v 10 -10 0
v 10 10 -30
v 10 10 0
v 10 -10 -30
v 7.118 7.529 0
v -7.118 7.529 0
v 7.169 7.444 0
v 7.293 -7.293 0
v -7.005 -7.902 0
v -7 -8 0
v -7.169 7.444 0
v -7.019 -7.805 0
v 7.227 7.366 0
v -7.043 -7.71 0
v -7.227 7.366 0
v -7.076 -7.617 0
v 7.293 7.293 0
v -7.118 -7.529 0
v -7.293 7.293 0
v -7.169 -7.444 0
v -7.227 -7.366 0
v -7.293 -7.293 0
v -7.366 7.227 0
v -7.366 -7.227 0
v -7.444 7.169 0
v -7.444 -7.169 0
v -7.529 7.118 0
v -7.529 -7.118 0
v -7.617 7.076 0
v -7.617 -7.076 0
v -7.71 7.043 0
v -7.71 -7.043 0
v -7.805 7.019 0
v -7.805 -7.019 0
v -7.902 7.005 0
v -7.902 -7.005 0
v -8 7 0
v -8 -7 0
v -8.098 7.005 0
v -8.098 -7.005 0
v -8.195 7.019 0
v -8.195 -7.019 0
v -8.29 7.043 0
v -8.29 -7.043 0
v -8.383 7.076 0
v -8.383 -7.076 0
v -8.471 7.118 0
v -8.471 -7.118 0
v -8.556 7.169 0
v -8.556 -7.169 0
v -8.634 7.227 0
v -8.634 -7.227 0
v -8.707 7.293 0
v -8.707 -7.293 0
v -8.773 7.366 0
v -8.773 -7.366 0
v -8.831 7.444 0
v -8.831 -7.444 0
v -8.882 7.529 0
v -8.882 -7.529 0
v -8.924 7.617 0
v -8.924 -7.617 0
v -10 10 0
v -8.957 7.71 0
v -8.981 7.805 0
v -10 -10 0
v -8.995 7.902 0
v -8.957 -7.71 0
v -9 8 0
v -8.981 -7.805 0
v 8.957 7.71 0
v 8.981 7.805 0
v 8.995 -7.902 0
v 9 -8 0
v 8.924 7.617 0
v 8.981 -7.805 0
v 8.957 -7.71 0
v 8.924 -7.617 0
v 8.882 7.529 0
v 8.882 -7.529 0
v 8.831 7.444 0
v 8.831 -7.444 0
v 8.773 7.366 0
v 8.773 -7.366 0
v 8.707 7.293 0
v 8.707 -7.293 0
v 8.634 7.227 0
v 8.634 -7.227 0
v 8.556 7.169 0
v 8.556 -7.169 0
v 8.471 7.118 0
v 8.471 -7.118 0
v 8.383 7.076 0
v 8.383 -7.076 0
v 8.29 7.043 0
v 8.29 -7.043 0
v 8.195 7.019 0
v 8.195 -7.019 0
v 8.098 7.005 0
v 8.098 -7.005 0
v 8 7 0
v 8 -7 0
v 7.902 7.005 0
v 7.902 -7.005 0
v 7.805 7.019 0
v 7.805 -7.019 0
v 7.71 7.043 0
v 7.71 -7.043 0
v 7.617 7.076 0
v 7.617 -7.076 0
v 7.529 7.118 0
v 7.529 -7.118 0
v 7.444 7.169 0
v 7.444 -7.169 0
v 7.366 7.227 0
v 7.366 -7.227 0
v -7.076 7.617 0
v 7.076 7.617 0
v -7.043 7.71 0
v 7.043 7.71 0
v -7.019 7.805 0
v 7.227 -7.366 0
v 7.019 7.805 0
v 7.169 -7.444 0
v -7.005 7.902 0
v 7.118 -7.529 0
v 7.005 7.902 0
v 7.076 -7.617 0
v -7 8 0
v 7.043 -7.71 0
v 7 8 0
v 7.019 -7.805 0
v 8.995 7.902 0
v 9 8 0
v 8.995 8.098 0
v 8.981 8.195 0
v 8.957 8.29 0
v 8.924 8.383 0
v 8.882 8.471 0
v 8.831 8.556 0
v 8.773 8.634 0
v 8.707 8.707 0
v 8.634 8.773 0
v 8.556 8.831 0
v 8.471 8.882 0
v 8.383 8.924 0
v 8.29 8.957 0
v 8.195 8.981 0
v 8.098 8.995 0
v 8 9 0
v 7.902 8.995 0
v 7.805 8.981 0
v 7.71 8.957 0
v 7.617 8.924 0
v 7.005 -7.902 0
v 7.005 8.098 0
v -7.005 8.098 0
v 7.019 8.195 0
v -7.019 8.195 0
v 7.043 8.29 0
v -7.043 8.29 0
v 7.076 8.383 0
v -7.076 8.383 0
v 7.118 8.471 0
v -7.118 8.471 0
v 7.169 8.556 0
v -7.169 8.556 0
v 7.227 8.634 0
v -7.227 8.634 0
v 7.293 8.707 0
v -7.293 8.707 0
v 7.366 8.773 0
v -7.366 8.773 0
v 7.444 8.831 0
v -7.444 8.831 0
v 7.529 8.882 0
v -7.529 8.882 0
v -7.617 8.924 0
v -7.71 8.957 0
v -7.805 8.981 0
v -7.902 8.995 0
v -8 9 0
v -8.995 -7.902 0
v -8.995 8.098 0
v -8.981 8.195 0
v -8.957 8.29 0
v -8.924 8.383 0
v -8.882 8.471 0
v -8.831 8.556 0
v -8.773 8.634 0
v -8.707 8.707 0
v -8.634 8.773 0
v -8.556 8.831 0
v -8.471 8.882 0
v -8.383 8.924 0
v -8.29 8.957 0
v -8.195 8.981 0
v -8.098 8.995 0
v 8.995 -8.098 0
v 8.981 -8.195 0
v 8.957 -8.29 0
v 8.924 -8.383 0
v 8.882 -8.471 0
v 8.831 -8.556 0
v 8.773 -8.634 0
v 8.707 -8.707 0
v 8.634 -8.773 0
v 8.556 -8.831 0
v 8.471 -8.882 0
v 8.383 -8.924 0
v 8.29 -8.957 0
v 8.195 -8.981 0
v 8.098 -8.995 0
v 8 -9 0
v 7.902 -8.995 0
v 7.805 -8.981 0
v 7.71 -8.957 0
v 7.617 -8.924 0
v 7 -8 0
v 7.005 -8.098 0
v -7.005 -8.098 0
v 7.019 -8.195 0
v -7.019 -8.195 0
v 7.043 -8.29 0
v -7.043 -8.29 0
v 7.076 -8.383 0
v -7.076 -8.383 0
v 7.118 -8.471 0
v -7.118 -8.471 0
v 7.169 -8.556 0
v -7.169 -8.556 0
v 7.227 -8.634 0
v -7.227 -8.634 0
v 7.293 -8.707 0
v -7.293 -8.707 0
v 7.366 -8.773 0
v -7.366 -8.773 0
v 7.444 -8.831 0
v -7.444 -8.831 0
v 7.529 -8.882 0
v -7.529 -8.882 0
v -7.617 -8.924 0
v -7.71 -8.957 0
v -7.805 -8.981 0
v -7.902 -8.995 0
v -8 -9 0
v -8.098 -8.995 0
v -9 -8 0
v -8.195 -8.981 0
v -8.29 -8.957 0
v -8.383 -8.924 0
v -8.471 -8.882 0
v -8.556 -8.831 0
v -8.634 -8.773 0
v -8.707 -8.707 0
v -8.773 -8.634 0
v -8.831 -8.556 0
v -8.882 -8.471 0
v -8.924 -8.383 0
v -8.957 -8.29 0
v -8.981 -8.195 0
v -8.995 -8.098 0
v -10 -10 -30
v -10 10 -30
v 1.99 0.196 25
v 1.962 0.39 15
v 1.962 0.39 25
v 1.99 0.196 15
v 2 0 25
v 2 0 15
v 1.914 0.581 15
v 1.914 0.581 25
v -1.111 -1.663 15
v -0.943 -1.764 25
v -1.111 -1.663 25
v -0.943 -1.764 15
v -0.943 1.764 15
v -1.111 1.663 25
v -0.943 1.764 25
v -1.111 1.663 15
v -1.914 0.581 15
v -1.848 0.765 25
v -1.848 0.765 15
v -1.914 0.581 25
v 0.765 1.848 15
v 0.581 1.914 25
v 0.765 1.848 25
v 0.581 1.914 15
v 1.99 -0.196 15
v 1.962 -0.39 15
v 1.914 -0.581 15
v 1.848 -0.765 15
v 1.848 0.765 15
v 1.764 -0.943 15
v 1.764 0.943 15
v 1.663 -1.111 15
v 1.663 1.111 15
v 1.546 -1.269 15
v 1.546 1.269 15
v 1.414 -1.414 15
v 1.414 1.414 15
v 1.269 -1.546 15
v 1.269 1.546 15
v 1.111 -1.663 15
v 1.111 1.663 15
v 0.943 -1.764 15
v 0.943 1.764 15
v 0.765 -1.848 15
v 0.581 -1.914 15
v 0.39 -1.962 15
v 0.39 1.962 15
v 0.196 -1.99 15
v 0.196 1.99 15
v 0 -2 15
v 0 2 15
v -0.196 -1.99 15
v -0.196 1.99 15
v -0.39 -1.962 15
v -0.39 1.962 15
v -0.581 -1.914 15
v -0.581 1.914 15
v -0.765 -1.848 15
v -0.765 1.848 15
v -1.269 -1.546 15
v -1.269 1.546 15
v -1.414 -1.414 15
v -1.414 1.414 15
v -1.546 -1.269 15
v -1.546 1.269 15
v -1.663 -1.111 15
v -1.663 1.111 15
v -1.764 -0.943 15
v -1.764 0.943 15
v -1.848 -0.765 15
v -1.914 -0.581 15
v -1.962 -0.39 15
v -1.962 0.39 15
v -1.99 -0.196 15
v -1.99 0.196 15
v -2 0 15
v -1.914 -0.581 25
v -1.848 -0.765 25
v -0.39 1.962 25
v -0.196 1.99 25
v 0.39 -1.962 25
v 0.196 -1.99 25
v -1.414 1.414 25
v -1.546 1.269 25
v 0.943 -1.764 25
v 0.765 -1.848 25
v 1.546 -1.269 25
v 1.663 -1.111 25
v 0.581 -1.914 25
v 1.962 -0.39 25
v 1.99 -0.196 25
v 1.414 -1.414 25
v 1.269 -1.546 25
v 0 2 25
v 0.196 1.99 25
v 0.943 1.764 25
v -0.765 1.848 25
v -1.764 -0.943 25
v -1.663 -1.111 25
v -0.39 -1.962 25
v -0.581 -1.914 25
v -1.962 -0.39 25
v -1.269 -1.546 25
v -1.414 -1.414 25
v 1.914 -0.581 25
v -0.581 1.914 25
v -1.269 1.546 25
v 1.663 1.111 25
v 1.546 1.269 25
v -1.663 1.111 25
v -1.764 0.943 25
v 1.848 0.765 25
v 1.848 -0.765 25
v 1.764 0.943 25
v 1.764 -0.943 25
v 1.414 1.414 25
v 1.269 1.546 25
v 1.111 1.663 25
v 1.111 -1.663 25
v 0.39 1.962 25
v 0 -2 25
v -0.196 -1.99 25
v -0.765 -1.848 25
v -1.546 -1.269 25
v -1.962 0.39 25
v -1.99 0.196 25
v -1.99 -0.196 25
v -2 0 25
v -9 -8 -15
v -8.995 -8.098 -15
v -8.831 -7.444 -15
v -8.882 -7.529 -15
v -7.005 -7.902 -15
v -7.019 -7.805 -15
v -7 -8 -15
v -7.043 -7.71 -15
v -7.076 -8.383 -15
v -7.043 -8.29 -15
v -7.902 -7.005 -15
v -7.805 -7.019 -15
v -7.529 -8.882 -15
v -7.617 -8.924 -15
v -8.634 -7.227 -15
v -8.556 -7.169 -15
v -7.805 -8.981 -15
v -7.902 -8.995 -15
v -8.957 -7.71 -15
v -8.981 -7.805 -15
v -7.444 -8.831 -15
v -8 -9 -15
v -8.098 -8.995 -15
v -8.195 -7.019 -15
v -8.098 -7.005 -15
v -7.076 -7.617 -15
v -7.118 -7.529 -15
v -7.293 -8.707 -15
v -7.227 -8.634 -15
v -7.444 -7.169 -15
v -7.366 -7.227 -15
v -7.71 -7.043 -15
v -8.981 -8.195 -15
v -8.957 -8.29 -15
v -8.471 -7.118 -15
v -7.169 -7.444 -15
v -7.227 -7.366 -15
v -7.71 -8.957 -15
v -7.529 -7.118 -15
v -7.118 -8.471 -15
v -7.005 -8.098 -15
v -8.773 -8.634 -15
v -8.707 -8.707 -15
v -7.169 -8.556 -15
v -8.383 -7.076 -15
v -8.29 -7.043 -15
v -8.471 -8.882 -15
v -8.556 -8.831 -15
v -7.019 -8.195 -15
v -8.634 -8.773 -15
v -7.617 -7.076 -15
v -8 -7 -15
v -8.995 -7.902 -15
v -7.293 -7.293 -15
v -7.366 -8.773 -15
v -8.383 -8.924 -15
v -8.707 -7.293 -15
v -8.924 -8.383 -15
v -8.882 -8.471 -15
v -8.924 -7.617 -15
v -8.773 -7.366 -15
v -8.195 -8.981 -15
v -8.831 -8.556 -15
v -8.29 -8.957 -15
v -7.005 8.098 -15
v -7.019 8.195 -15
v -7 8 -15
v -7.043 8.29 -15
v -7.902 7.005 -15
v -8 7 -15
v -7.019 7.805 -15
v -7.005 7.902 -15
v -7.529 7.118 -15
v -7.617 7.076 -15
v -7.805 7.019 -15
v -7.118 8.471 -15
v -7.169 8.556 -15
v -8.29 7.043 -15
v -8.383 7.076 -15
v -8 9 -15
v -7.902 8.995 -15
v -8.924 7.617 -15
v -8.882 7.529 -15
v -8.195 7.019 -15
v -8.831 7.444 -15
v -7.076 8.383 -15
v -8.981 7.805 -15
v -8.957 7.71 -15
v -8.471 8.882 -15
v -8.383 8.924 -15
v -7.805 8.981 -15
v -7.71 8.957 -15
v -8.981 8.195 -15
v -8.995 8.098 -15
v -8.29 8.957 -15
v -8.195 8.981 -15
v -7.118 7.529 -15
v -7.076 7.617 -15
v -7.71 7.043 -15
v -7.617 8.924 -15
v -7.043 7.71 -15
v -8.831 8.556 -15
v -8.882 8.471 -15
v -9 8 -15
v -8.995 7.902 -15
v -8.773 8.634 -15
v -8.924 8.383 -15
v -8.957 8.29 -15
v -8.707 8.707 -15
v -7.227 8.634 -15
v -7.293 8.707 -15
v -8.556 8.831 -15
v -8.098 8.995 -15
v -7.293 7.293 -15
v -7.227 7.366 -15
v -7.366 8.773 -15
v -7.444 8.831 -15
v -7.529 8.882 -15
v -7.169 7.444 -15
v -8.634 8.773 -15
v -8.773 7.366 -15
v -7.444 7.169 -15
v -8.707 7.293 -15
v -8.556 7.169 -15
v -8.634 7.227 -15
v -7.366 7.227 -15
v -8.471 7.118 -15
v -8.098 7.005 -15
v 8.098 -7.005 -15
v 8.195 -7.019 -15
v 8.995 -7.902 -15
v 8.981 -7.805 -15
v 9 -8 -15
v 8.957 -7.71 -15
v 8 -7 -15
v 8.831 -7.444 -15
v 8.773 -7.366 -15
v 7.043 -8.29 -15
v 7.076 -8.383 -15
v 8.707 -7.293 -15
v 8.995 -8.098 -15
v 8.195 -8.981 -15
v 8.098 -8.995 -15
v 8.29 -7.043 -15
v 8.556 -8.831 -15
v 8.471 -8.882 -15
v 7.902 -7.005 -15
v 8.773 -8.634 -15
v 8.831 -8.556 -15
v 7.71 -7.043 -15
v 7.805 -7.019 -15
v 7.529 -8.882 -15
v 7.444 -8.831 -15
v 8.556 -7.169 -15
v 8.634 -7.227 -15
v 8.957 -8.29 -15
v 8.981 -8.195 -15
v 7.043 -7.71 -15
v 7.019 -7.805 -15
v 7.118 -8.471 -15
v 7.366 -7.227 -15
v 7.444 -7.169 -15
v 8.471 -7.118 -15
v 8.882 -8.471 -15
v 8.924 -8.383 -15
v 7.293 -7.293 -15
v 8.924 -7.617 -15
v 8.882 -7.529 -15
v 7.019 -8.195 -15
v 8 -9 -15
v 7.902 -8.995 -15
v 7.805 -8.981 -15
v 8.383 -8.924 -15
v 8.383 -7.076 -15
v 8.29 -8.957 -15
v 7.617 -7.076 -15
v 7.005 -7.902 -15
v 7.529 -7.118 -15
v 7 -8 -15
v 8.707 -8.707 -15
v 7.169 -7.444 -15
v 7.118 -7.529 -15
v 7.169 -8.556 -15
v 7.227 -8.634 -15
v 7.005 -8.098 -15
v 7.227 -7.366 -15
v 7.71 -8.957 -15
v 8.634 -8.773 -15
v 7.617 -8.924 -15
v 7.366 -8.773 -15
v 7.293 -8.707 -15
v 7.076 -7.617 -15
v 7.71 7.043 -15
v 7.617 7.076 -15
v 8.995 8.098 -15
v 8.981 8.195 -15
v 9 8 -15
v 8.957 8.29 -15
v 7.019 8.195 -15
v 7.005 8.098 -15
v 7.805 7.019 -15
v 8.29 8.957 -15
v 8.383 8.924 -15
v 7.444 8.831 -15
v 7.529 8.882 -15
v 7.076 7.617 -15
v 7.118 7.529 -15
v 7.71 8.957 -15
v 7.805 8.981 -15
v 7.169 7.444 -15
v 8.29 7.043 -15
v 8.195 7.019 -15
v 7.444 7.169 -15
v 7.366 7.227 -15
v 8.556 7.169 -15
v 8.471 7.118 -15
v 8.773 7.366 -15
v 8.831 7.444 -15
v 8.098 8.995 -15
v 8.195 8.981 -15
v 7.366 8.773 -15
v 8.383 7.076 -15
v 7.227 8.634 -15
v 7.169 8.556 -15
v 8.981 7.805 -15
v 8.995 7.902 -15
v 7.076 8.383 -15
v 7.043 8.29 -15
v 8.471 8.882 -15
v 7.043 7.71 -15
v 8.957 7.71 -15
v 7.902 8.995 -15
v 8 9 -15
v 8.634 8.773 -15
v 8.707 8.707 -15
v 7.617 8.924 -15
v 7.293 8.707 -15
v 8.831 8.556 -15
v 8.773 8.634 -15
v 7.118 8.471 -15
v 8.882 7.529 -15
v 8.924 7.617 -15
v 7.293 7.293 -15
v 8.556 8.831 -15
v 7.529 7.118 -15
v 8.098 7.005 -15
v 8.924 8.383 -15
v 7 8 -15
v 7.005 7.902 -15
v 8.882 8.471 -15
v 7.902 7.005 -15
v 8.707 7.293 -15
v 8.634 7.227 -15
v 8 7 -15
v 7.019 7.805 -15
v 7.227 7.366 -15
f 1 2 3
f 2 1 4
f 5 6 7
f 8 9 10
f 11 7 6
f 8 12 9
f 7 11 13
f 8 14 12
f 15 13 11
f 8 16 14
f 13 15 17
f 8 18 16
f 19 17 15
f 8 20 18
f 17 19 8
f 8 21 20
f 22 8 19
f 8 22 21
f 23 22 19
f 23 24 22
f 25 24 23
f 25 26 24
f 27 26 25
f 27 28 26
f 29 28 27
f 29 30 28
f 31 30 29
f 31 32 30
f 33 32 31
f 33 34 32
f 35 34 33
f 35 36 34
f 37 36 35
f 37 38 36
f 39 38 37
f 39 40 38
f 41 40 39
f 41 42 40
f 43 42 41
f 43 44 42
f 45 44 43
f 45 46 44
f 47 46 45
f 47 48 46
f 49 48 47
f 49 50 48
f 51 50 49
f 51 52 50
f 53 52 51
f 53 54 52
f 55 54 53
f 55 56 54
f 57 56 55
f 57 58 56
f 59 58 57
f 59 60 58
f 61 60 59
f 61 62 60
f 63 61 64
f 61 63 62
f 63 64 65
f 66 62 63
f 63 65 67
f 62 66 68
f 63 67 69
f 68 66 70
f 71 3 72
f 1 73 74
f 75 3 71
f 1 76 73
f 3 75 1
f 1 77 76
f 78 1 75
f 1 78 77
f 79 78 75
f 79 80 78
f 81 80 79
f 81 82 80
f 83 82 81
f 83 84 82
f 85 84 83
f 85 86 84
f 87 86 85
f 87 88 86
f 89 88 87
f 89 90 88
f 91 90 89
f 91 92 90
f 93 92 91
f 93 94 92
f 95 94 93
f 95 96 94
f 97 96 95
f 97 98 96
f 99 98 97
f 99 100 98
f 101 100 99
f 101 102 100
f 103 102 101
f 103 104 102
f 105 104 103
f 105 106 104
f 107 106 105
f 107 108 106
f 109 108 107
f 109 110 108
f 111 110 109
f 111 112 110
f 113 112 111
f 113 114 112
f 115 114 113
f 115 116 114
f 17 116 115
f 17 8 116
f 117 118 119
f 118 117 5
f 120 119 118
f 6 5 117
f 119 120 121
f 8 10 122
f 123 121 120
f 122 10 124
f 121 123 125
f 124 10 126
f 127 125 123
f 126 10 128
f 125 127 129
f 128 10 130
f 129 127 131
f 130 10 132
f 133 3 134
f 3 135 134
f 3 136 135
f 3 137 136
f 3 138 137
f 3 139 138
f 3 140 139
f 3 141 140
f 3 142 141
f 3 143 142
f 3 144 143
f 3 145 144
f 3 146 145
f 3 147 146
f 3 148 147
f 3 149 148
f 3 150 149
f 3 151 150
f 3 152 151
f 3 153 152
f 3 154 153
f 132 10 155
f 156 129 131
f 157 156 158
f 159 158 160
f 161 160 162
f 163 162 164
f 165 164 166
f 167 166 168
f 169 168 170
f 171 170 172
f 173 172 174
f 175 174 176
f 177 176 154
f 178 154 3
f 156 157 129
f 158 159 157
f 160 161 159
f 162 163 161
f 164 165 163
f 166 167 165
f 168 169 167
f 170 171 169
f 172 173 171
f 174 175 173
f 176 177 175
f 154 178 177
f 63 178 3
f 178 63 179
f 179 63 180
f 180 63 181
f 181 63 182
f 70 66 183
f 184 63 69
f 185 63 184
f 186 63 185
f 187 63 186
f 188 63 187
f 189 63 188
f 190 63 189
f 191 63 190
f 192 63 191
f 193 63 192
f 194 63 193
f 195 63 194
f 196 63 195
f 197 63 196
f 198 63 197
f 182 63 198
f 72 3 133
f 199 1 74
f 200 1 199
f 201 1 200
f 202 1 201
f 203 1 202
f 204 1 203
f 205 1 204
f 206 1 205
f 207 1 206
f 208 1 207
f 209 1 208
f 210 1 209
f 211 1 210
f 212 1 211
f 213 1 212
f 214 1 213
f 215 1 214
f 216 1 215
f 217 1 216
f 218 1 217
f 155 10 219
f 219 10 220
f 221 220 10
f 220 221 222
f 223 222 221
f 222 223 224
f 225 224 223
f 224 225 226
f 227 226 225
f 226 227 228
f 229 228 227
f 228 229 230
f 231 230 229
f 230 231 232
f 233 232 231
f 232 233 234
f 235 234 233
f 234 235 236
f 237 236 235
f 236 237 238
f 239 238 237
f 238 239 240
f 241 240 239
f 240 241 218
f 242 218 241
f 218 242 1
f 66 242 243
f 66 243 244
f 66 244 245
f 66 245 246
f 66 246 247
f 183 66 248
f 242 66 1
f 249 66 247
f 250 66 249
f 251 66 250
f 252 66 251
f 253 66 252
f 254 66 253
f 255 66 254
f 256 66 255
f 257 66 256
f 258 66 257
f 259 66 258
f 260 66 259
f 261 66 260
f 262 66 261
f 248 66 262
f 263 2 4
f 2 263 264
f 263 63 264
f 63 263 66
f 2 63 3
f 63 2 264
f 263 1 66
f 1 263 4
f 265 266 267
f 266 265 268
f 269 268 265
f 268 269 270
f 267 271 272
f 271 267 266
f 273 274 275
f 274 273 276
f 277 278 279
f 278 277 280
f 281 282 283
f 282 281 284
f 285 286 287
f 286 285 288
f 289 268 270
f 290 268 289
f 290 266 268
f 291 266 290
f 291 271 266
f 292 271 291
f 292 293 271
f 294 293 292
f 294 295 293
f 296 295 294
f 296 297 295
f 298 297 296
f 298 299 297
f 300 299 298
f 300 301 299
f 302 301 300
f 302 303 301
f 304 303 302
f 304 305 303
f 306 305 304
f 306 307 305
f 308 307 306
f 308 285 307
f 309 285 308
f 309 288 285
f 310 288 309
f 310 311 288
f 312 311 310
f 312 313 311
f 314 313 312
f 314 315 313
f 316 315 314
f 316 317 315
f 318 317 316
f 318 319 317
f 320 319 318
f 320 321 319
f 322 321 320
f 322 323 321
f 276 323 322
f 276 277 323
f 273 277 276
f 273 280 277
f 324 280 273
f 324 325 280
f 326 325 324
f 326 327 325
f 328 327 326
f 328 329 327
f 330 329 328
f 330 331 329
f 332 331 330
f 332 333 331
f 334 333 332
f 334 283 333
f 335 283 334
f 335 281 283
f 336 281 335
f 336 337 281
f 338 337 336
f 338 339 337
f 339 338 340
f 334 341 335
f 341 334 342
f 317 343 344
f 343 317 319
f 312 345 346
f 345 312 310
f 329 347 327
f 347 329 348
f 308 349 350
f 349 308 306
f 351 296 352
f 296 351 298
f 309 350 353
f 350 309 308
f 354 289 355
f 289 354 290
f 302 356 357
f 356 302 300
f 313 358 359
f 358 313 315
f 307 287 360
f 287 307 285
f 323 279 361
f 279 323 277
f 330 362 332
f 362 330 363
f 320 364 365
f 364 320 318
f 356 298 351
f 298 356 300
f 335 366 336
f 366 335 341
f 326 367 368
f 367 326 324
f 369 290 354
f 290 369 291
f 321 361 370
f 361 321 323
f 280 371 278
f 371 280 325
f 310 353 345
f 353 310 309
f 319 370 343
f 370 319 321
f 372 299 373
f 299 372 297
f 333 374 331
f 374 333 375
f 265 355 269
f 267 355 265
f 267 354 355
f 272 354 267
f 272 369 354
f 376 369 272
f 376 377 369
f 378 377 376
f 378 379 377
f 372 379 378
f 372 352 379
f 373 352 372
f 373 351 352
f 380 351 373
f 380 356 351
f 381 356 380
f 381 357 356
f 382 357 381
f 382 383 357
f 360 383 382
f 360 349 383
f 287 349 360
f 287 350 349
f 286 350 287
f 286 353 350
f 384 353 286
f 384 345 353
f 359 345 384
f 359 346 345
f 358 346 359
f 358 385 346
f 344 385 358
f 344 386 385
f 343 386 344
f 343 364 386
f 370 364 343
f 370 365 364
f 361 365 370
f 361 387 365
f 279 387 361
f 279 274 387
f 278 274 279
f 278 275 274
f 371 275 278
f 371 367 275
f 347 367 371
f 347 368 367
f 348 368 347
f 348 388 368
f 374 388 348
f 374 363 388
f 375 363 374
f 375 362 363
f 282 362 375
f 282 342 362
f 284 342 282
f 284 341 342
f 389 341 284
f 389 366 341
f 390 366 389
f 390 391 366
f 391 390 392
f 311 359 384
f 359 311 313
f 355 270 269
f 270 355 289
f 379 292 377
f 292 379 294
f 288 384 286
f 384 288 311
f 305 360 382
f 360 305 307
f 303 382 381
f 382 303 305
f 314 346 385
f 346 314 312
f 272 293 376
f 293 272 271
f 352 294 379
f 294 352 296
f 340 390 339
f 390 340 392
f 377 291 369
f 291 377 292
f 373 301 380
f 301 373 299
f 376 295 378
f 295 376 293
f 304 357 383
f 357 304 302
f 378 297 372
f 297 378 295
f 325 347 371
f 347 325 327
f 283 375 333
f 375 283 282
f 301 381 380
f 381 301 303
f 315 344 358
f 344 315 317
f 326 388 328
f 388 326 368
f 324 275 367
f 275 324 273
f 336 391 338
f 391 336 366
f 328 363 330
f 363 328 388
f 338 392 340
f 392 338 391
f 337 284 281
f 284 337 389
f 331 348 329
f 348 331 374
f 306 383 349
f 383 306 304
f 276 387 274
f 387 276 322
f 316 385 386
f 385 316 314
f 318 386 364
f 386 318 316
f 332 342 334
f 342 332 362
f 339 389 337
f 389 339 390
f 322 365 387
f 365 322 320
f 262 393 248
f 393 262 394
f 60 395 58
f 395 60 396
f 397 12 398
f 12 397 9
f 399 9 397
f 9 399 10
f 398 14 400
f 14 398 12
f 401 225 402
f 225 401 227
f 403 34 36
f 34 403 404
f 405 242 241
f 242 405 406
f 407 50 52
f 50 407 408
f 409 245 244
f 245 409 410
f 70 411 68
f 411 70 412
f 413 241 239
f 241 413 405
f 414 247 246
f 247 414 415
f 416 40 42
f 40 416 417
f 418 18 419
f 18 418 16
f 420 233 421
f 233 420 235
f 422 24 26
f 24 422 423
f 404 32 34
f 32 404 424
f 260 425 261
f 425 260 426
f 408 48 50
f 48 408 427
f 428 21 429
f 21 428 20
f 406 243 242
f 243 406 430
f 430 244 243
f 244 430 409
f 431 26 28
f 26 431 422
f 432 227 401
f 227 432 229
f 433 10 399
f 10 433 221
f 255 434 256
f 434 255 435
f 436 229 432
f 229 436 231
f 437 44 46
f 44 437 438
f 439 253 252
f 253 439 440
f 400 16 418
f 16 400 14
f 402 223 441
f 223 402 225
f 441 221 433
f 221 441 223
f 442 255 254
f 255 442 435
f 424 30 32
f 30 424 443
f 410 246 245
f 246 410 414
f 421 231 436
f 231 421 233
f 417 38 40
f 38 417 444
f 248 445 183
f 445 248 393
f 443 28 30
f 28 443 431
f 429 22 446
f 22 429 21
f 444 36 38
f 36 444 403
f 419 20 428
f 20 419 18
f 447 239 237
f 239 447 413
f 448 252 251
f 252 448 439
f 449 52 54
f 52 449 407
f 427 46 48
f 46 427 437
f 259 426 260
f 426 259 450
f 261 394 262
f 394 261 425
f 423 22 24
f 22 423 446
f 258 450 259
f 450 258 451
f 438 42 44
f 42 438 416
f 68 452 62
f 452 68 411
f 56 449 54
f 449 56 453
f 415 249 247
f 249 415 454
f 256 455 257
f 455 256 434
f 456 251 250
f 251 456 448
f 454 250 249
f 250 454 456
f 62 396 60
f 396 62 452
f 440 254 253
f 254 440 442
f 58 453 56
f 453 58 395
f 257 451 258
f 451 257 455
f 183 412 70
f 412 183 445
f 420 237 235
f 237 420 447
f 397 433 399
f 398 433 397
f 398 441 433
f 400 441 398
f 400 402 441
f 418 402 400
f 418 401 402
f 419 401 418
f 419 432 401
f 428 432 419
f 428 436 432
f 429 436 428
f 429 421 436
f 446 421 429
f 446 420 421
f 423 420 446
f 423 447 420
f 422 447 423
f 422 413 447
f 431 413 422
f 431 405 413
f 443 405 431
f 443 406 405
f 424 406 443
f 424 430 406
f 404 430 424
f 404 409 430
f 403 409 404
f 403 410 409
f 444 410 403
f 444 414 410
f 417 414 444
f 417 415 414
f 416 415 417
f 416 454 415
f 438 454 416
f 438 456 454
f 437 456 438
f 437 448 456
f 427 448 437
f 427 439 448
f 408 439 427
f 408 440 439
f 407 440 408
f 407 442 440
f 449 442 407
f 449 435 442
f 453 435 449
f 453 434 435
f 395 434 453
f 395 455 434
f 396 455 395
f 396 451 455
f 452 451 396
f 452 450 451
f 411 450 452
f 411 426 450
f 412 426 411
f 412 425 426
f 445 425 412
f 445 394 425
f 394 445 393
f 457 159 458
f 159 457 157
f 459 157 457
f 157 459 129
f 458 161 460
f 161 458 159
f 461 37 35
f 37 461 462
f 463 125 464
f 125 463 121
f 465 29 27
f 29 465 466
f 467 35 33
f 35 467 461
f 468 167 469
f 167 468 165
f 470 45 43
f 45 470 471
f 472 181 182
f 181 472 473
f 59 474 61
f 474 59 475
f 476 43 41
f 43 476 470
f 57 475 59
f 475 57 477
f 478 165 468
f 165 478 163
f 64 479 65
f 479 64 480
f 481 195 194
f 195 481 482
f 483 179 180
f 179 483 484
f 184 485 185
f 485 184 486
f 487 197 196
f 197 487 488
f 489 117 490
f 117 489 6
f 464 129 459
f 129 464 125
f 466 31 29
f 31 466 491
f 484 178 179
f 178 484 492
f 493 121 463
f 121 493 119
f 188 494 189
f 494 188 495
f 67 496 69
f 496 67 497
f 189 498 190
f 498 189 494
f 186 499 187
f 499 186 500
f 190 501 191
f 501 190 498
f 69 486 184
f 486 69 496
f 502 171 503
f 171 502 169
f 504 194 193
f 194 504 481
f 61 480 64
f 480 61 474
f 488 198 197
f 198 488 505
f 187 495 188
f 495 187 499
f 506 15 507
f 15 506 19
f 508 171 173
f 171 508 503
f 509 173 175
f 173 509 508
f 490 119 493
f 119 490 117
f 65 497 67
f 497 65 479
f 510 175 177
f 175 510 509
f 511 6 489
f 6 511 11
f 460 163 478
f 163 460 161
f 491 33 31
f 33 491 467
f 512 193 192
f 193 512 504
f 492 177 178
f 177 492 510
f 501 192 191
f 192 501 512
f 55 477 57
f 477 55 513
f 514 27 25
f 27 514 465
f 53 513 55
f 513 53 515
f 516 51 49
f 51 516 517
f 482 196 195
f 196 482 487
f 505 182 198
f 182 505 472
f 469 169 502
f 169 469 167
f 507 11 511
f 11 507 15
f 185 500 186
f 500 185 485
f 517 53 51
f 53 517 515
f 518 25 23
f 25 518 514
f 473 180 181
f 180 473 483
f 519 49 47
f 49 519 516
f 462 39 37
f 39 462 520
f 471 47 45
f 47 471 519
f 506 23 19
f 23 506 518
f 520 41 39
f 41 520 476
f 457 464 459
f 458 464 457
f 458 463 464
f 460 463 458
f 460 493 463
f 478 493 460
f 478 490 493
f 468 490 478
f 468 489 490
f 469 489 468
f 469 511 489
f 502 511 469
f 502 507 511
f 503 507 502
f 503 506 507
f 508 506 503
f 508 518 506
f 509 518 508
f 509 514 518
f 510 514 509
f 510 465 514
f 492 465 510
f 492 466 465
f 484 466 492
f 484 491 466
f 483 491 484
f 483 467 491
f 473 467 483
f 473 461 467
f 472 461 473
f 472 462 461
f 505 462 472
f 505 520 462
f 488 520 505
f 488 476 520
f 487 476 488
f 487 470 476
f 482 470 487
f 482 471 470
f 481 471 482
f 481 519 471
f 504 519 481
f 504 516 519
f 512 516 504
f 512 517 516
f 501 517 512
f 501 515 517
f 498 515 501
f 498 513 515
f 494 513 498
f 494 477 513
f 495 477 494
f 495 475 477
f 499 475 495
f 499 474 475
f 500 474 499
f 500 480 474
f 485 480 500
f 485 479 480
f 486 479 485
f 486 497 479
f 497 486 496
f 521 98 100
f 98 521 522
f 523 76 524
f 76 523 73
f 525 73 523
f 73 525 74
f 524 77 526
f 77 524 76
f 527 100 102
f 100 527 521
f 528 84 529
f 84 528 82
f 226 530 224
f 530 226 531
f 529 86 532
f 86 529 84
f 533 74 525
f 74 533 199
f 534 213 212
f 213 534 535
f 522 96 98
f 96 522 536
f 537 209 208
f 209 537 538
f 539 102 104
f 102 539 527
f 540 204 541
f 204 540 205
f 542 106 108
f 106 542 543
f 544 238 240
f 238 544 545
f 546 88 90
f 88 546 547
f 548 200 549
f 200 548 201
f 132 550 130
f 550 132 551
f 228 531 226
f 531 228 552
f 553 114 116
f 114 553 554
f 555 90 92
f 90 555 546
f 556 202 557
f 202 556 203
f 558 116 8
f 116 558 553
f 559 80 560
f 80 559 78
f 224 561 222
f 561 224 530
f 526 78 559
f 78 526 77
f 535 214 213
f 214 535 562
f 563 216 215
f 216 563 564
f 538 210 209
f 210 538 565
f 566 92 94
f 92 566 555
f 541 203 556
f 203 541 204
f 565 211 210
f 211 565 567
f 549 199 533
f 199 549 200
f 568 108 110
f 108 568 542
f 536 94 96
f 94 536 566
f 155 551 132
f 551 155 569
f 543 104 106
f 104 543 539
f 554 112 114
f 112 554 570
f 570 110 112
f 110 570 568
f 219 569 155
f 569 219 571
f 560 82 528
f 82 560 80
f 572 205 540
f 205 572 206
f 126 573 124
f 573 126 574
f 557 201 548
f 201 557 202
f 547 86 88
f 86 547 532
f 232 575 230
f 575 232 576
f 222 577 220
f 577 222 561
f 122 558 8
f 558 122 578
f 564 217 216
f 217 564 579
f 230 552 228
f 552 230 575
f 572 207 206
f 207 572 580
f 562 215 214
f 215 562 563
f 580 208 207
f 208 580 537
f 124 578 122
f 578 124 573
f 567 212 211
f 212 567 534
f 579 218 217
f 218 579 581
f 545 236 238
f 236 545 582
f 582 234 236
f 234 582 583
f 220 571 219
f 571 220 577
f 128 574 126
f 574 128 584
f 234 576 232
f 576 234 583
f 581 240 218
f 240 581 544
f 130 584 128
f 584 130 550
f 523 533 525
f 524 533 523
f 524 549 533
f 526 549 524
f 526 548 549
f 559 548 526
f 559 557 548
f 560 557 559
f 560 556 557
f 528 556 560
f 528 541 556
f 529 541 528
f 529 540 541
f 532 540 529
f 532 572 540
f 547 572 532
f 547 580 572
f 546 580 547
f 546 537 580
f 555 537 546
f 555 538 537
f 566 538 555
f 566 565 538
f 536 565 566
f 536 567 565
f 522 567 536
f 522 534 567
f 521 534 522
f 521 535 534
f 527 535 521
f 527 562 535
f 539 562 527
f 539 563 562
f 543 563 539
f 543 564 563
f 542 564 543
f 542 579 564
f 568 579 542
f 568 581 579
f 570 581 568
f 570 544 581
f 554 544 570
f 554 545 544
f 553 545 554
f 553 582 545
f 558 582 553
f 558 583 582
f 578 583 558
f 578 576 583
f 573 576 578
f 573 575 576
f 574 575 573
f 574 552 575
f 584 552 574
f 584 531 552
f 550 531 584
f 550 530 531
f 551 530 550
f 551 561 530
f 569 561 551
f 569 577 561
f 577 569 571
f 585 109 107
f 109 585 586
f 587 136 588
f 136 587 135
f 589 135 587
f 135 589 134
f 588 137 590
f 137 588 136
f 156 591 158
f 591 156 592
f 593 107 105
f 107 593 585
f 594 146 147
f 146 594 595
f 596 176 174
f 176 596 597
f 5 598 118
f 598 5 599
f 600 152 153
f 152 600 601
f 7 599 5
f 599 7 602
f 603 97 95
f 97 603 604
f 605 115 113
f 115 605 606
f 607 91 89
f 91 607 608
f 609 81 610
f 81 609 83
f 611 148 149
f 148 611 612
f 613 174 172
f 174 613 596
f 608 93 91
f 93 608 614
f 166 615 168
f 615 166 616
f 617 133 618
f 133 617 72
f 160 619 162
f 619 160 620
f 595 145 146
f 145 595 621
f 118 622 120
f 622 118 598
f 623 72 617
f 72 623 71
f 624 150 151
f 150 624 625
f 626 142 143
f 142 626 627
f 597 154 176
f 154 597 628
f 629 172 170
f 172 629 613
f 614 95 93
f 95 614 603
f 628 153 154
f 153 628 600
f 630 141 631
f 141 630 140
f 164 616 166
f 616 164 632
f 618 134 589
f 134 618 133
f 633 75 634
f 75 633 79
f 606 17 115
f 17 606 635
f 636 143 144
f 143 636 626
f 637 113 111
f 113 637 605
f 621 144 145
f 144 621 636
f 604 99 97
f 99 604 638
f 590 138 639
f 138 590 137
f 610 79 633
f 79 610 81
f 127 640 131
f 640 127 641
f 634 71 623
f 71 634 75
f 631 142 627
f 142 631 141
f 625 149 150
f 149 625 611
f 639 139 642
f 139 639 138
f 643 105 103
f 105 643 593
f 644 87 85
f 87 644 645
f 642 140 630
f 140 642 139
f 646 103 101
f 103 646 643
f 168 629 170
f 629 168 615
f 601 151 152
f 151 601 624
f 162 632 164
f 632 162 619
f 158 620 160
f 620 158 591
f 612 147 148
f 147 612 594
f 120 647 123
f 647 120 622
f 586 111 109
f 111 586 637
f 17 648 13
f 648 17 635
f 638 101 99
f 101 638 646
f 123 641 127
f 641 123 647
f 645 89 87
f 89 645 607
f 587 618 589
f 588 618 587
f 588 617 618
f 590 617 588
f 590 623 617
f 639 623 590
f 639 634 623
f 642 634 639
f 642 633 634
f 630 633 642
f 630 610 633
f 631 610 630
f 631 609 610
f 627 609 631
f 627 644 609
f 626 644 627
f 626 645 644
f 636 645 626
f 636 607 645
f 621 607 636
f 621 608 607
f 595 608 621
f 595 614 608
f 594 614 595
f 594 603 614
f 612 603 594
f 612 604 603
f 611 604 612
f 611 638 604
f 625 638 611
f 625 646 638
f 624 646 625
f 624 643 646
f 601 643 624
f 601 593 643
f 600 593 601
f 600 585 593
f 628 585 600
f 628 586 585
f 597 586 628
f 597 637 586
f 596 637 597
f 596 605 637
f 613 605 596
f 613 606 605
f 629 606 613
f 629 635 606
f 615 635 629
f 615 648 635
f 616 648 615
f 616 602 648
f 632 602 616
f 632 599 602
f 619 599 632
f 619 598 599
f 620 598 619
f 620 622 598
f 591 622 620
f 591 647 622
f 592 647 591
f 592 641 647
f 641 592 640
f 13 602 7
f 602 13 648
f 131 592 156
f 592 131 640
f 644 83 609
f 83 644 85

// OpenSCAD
module stepper_motor() {
    // Motor body
    difference() {
        union() {
            // Main body
            translate([0, 0, -15])
                cube([20, 20, 30], center=true);
            // Shaft
            translate([0, 0, 15])
                cylinder(h=10, d=4, $fn=64);
        }
        // Mounting holes
        for (x = [-8, 8], y = [-8, 8]) {
            translate([x, y, 0])
                cylinder(h=30, d=2, center=true, $fn=64);
        }
    }
}

stepper_motor();
